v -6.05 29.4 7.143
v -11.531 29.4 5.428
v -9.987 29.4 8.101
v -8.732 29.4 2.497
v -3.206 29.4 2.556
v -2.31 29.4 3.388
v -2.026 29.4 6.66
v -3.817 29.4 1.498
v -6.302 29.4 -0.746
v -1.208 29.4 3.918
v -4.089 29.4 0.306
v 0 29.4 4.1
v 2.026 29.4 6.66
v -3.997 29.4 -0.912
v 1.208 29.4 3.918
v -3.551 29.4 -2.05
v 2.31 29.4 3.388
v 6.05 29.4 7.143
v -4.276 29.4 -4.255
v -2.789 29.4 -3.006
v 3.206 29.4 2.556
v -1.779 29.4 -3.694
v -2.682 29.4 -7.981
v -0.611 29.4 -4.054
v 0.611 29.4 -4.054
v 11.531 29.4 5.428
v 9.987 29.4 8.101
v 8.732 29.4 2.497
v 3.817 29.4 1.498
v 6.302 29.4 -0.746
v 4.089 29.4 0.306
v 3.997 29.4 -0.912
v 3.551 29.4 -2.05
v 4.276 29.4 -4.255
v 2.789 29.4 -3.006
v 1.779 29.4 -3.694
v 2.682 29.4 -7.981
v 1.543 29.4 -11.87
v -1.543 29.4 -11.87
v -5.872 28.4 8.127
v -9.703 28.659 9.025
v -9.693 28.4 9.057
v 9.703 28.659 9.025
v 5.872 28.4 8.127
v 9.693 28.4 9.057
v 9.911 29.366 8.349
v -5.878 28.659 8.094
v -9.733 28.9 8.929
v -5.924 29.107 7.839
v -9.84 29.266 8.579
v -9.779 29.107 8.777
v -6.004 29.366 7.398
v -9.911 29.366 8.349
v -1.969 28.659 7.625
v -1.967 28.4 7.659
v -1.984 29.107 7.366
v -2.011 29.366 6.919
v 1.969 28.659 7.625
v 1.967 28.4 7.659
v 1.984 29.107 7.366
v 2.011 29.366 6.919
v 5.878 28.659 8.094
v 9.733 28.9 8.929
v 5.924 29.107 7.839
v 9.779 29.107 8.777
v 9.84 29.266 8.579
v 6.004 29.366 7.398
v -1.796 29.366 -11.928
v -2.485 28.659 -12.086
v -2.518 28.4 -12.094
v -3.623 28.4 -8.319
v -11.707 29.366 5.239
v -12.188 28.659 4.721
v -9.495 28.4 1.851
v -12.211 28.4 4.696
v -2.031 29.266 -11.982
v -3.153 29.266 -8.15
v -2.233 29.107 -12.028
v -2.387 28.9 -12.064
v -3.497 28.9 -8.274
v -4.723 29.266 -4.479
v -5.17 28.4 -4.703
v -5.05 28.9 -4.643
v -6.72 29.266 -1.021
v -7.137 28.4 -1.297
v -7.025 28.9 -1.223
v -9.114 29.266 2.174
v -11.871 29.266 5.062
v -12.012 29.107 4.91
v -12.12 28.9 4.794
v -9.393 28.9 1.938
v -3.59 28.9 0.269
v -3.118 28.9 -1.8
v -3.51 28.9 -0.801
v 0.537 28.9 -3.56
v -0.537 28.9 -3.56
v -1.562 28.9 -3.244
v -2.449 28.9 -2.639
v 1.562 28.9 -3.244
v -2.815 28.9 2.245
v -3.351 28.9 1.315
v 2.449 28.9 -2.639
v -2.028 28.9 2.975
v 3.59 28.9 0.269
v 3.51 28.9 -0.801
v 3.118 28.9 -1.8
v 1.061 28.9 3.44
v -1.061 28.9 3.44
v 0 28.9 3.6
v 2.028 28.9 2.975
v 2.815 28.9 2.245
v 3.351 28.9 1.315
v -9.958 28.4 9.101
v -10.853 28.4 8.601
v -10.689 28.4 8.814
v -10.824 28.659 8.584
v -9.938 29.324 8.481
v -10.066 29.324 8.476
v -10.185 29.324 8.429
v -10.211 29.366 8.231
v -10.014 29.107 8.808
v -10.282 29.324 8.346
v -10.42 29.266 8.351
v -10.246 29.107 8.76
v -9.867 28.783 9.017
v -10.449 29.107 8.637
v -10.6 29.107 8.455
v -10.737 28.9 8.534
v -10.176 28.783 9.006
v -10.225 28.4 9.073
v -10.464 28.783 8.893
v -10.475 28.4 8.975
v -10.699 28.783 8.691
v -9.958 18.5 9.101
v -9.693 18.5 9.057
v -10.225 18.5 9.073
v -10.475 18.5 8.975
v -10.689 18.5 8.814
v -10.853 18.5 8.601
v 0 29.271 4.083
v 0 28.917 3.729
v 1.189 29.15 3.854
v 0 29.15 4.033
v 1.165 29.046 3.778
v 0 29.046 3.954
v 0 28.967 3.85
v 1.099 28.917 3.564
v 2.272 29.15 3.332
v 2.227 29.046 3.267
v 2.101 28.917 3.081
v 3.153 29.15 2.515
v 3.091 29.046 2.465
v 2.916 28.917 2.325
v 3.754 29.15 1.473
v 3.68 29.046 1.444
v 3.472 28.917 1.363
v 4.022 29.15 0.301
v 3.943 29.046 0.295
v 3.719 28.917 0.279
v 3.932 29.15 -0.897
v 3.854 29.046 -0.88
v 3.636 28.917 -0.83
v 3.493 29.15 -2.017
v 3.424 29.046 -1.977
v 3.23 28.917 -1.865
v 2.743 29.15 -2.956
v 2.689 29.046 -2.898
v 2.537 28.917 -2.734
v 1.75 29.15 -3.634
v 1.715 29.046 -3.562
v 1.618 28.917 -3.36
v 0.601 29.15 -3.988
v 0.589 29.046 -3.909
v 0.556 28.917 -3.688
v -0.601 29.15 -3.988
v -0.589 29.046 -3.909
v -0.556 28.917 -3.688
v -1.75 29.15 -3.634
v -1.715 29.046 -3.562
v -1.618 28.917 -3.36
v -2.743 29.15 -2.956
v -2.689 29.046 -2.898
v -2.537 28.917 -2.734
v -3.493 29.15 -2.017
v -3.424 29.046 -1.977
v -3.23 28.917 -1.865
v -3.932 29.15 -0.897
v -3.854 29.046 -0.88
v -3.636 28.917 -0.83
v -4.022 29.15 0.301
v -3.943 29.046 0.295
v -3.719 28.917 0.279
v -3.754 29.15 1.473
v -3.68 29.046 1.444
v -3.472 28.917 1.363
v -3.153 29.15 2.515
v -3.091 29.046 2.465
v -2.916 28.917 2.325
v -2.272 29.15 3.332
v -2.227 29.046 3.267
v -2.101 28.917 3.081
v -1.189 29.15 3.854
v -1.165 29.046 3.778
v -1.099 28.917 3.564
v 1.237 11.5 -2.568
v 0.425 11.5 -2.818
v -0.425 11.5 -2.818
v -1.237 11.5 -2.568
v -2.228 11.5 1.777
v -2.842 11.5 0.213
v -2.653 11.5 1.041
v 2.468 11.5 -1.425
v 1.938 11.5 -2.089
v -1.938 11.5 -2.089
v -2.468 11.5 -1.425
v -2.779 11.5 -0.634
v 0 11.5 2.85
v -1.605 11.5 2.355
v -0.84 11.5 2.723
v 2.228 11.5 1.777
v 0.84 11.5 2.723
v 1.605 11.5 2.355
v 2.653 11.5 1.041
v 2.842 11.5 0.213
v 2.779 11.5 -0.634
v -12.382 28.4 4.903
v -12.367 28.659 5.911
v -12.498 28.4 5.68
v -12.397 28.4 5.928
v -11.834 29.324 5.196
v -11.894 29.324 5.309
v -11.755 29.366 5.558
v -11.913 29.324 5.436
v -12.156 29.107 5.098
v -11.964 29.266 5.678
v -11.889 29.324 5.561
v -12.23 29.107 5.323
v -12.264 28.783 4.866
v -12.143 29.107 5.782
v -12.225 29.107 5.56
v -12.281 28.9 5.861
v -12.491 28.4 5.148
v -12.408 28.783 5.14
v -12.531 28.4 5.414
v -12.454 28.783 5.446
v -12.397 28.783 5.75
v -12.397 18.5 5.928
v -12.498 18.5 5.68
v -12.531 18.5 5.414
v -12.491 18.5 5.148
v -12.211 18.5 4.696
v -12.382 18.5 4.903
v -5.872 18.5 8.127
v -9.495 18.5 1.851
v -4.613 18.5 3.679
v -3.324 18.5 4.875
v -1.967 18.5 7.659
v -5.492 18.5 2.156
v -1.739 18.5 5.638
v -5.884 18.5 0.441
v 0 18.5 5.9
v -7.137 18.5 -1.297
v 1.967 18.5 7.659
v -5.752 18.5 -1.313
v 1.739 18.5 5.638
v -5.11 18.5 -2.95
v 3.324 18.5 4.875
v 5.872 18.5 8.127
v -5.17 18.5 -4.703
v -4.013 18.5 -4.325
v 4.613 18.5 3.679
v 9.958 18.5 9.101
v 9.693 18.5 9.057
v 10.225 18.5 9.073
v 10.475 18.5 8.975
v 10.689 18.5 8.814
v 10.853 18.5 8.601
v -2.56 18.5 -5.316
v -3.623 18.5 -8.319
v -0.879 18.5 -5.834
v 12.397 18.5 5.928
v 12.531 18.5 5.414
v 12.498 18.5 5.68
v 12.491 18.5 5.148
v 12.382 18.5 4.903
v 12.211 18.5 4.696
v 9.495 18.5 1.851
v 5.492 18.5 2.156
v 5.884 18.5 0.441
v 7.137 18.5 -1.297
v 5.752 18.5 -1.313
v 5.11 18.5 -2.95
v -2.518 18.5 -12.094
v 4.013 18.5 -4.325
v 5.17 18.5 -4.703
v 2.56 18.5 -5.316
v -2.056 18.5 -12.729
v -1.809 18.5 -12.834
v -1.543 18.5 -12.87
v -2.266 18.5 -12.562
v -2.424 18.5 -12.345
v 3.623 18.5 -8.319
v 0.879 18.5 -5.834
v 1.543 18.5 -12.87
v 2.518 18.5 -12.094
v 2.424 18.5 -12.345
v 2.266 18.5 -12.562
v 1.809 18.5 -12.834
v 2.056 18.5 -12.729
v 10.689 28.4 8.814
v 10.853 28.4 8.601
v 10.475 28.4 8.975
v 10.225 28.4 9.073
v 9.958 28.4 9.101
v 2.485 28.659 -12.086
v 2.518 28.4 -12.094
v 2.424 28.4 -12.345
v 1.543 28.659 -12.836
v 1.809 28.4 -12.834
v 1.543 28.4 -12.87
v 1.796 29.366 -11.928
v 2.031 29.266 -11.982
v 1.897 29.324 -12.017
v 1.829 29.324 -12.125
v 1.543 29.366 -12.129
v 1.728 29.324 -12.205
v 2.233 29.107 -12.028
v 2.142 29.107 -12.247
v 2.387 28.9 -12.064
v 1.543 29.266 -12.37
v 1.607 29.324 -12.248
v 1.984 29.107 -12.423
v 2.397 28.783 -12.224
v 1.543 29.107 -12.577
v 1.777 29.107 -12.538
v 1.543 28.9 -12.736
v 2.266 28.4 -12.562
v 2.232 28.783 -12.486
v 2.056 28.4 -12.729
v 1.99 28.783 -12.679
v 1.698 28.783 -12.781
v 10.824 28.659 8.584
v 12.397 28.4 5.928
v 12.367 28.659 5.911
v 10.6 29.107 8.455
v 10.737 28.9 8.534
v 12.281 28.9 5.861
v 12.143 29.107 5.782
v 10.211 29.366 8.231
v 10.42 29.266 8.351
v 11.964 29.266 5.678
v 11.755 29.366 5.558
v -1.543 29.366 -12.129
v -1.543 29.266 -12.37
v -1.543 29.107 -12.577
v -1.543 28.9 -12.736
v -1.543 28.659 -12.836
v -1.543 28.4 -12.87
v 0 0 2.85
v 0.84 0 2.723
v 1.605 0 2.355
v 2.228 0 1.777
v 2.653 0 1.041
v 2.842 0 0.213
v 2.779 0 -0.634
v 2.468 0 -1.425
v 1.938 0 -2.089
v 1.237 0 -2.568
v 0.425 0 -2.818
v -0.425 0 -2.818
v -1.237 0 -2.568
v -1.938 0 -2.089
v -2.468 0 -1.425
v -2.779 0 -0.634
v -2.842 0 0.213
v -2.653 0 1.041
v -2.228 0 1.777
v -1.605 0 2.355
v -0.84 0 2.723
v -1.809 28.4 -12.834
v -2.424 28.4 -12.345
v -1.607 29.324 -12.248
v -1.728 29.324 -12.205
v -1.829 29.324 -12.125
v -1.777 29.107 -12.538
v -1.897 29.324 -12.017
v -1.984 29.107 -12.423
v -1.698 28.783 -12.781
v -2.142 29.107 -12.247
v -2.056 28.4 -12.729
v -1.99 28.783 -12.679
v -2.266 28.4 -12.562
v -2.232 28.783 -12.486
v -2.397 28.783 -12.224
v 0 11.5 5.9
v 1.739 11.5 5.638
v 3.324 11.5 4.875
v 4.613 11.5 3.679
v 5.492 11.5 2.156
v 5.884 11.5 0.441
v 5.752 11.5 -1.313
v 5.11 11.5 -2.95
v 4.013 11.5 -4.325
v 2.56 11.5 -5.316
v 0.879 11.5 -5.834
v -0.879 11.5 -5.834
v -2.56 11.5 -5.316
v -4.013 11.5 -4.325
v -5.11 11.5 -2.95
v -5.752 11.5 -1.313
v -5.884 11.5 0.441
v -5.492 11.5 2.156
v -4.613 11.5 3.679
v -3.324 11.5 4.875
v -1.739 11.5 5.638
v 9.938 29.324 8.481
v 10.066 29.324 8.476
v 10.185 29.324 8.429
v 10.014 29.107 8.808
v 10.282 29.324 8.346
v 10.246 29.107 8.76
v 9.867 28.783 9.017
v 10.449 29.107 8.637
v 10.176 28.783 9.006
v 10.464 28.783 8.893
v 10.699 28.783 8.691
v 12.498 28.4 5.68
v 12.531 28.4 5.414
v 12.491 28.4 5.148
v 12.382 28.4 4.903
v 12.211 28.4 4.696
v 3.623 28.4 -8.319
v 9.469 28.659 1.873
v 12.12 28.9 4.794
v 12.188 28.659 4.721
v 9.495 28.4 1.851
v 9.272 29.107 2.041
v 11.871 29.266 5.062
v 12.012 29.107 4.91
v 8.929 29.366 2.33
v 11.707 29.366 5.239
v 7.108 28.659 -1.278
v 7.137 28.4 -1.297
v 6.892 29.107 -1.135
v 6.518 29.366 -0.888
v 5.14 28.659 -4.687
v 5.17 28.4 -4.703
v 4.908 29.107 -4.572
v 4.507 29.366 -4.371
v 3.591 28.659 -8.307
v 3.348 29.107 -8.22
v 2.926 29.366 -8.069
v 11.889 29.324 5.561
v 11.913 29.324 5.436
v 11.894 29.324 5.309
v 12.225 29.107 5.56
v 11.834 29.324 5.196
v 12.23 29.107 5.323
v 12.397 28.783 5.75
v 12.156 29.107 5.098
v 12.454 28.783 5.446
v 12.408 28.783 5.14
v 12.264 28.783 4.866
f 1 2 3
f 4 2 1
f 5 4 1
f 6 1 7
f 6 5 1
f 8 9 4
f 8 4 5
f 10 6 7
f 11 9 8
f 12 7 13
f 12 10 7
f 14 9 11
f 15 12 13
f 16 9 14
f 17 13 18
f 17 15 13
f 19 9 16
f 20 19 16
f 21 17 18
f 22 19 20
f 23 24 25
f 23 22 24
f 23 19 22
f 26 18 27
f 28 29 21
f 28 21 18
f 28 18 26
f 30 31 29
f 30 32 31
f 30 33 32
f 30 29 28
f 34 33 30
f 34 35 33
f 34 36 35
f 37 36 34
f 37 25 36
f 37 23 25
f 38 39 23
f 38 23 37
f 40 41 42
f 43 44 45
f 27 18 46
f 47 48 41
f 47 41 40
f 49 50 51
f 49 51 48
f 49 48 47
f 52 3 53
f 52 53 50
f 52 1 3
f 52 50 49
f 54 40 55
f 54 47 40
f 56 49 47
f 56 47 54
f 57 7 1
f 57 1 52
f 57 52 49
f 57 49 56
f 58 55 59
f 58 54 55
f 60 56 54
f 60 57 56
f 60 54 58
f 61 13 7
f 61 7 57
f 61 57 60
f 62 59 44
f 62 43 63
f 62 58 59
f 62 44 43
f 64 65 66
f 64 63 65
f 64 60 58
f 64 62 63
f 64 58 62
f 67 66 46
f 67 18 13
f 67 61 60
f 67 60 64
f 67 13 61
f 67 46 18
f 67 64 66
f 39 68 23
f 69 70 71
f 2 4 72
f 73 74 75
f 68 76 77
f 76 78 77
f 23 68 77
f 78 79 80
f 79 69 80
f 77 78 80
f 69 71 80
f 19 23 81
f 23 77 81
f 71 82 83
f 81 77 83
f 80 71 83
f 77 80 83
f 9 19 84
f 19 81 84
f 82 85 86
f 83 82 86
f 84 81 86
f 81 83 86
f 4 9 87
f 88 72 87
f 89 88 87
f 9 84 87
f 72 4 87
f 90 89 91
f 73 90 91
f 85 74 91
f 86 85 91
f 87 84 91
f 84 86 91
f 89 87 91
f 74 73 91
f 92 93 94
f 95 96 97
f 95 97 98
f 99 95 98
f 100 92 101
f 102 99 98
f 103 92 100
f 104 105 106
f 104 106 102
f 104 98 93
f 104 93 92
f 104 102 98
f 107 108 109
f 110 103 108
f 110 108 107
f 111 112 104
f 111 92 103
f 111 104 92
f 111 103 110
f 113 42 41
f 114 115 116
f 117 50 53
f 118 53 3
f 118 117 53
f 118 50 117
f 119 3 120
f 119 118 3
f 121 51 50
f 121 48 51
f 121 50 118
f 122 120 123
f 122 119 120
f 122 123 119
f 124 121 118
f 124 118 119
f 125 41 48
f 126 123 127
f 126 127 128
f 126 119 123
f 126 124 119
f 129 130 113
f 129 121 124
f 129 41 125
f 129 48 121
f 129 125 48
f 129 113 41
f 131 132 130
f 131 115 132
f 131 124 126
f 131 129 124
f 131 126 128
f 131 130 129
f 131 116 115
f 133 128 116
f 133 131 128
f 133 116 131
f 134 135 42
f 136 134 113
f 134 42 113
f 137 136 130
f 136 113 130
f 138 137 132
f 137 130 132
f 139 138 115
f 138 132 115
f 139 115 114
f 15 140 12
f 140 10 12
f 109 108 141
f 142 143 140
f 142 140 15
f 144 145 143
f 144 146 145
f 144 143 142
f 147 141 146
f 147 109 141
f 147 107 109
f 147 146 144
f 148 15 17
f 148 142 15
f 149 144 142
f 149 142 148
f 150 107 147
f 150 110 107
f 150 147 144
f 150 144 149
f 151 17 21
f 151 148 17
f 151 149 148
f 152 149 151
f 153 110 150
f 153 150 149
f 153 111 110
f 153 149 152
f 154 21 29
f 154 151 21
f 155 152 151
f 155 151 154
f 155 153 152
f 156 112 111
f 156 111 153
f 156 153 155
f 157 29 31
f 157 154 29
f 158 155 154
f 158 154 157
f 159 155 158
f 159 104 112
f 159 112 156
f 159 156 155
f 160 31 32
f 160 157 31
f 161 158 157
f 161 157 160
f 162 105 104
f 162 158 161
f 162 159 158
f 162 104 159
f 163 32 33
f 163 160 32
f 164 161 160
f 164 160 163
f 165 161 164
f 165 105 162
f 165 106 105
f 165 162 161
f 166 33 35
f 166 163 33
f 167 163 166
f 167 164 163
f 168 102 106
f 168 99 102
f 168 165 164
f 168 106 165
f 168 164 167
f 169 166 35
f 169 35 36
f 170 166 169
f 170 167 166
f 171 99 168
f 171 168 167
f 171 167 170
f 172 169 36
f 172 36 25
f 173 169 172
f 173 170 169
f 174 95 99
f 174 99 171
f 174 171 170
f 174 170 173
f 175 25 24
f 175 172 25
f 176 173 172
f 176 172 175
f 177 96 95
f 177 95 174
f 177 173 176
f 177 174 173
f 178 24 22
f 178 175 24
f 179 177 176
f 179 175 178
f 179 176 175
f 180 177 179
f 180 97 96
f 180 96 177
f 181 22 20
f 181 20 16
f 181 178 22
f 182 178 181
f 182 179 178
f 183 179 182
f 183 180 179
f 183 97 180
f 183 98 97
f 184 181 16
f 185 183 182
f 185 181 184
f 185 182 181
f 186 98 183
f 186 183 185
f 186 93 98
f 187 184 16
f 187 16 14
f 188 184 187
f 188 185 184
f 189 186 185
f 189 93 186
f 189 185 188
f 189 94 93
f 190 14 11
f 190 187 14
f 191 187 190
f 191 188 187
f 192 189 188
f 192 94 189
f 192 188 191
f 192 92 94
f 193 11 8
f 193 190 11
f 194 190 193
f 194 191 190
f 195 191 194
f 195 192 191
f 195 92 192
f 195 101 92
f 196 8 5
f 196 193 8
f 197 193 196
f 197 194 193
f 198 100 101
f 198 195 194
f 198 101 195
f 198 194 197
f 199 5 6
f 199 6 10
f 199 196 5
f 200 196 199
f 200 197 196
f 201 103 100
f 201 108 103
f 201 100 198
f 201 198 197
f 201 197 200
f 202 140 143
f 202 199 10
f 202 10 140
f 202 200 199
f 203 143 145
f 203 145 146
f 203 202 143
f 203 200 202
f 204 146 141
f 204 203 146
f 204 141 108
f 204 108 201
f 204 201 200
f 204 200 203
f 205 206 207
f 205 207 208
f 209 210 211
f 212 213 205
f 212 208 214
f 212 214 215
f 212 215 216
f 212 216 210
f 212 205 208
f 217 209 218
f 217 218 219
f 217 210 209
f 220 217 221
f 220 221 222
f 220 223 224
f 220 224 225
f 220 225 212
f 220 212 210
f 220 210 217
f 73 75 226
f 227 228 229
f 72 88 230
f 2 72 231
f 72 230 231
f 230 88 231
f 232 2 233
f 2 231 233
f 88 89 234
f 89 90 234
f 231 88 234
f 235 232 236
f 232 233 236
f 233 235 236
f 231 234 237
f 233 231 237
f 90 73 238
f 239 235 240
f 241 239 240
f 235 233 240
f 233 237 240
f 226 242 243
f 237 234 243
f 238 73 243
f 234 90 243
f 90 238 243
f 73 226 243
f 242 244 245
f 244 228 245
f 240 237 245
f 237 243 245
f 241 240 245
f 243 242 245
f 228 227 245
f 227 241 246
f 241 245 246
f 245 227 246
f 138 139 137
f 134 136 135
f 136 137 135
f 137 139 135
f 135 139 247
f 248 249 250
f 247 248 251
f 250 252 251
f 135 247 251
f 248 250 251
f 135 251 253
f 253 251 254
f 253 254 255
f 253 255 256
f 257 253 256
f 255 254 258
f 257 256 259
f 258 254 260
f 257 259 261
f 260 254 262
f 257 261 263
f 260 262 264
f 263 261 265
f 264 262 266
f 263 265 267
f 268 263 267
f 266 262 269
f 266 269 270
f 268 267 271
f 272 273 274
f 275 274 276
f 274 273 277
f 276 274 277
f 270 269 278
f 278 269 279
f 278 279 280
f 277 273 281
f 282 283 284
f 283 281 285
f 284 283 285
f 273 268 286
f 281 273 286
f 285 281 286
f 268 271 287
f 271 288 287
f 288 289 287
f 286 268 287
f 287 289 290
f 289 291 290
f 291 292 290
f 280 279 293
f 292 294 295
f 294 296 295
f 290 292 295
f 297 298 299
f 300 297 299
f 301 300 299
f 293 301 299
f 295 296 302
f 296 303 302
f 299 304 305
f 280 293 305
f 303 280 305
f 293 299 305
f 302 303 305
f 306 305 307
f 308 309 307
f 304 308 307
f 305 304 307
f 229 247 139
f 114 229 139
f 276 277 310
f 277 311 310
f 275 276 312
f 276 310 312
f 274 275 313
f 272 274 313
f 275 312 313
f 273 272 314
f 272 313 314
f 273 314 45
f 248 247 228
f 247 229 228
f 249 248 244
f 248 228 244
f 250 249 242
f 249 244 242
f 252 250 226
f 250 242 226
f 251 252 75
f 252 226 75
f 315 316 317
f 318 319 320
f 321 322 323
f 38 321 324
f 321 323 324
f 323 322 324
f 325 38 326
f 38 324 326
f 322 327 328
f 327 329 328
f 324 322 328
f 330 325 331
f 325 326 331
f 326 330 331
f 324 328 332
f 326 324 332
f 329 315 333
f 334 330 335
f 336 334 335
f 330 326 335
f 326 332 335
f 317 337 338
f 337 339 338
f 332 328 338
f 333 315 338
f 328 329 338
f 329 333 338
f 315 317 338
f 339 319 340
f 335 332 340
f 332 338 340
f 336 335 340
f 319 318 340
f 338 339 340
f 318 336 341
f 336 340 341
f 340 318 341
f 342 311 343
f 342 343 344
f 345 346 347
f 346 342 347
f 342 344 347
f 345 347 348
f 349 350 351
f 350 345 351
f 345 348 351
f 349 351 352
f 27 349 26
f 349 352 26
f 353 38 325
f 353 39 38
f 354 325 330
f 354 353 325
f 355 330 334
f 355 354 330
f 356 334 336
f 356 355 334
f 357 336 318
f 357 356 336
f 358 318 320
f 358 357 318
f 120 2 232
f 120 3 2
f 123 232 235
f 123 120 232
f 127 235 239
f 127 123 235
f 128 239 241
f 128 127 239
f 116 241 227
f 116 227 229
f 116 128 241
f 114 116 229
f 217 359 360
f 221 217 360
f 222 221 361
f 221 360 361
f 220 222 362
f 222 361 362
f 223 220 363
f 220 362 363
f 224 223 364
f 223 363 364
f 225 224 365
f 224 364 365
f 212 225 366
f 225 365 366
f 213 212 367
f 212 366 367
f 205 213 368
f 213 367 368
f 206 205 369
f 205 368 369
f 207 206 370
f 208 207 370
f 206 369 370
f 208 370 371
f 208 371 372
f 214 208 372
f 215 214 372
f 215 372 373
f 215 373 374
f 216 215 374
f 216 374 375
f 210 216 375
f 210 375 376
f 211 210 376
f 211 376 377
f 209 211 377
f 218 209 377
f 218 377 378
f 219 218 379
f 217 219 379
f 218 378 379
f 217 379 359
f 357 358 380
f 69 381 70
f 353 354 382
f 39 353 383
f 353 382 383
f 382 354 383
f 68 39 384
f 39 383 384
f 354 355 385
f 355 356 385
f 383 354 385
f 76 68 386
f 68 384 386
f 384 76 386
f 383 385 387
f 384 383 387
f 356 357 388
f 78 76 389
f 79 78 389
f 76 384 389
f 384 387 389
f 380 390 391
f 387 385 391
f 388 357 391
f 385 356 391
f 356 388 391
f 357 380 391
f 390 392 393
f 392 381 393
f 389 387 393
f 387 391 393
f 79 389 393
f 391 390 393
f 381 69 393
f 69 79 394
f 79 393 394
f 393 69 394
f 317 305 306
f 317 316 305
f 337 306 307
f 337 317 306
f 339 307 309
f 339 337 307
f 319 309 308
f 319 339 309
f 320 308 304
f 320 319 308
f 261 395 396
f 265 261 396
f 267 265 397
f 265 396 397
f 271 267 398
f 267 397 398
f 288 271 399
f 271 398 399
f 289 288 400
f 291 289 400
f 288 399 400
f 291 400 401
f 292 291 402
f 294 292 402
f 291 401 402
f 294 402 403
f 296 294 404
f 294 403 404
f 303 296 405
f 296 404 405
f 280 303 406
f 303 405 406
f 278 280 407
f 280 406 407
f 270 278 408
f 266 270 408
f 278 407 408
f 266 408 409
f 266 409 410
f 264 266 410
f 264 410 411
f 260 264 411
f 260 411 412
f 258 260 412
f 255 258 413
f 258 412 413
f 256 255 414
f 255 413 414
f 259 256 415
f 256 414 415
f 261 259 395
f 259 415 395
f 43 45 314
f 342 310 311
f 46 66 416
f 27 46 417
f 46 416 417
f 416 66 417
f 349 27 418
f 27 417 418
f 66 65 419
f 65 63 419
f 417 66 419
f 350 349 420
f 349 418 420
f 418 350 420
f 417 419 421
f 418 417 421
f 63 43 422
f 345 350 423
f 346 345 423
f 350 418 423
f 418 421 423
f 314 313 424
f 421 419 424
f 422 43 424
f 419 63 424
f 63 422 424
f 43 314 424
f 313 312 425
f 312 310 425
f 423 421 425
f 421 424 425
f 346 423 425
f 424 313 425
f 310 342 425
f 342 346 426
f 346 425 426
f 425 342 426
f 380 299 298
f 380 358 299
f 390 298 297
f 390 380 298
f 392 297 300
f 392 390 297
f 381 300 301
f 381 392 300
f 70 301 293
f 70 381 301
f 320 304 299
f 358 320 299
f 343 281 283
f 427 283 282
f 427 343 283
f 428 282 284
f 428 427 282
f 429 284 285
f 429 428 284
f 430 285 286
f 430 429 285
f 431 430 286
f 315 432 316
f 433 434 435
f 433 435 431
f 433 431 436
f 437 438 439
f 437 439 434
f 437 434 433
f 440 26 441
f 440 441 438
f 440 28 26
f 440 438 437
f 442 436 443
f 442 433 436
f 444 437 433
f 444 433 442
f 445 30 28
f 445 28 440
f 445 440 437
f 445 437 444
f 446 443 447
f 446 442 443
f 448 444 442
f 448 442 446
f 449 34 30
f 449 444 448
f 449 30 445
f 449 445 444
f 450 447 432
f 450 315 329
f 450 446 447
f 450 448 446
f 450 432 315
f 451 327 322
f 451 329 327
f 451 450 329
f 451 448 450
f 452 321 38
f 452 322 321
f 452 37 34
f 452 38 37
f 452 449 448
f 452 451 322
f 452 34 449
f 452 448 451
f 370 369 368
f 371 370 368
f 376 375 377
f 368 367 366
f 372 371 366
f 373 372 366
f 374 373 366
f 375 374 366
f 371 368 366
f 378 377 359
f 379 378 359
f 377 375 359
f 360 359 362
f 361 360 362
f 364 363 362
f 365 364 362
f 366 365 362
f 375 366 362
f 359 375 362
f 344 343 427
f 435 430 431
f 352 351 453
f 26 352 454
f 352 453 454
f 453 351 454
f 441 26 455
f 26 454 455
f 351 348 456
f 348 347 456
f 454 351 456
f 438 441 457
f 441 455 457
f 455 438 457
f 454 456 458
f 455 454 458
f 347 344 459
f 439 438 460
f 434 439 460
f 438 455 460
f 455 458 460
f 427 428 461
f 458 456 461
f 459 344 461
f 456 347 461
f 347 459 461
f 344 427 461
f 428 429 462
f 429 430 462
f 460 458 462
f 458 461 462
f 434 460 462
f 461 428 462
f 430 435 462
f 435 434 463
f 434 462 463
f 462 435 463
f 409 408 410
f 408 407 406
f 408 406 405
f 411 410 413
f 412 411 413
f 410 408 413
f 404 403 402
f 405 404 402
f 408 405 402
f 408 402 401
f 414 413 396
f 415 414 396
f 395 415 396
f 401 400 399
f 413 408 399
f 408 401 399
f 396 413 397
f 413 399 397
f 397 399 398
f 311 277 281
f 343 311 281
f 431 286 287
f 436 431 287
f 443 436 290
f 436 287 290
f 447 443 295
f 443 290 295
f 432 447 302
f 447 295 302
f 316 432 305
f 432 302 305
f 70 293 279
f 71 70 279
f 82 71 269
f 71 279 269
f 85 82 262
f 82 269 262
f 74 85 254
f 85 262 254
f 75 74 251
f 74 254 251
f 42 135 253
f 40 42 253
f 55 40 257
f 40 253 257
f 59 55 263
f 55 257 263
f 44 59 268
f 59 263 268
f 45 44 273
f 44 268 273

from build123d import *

# Parameters (mm, degrees)
SKETCH1_R           = 2.85
BOSS_EXTRUDE1_DEPTH = 11.5
SKETCH2_R           = 5.9
BOSS_EXTRUDE2_DEPTH = 7
BOSS_EXTRUDE3_DEPTH = 10.9
FILLET1_R           = 1
SKETCH4_R           = 4.1
CUT_EXTRUDE1_DEPTH  = 0.5
FILLET2_R           = 0.5


with BuildPart() as part:
    # Sketch1 → Boss-Extrude1 (new body)
    with BuildSketch(Plane(origin=(0, 0, 0), x_dir=(1, 0, 0), z_dir=(0, 1, 0))):
        with Locations(Location((0, 0, 0), (0, 0, 270))):
            Circle(SKETCH1_R)
    extrude(amount=BOSS_EXTRUDE1_DEPTH)


with BuildPart() as body_2:
    # Sketch2 → Boss-Extrude2 (new body)
    with BuildSketch(Plane(origin=(0, 11.5, 0), x_dir=(1, 0, 0), z_dir=(0, 1, 0))):
        with Locations(Location((0, 0, 0), (0, 0, 270))):
            Circle(SKETCH2_R)
    extrude(amount=BOSS_EXTRUDE2_DEPTH)

    # Sketch3 → Boss-Extrude3 (add)
    with BuildSketch(Plane(origin=(0, 18.5, 0), x_dir=(1, 0, 0), z_dir=(0, 1, 0))):
        with BuildLine():
            Line((10.45, -9.3), (12.8, -5.229680602))
            ThreePointArc((12.8, -5.229680602), (6.102756814, 2.970284867), (2.35, 12.870250337))
            Line((2.35, 12.870250337), (-2.35, 12.870250337))
            ThreePointArc((-2.35, 12.870250337), (-6.102756814, 2.970284867), (-12.8, -5.229680602))
            Line((-12.8, -5.229680602), (-10.45, -9.3))
            ThreePointArc((-10.45, -9.3), (0, -7.6), (10.45, -9.3))
        make_face()
    extrude(amount=BOSS_EXTRUDE3_DEPTH)

    # Fillet1
    fillet1_edges = [body_2.edges().sort_by_distance(p)[0] for p in [
        (-11.625, 29.4, 7.264840301),
        (-10.45, 23.95, 9.3),
        (10.45, 23.95, 9.3),
        (12.8, 23.95, 5.229680602),
        (2.35, 23.95, -12.870250337),
        (-2.35, 23.95, -12.870250337),
        (-12.8, 23.95, 5.229680602),
        (0, 29.4, 7.6),
        (11.625, 29.4, 7.264840301),
        (6.102756814, 29.4, -2.970284867),
        (0, 29.4, -12.870250337),
        (-6.102756814, 29.4, -2.970284867),
    ]]
    fillet(fillet1_edges, radius=FILLET1_R)

    # Sketch4 → Cut-Extrude1 (cut)
    with BuildSketch(Plane(origin=(0, 29.4, 0), x_dir=(1, 0, 0), z_dir=(0, 1, 0))):
        with Locations(Location((0, 0, 0), (0, 0, 270))):
            Circle(SKETCH4_R)
    extrude(amount=-CUT_EXTRUDE1_DEPTH, mode=Mode.SUBTRACT)

    # Fillet2
    fillet2_edges = [body_2.edges().sort_by_distance(p)[0] for p in [
        (0, 28.9, -4.1),
    ]]
    fillet(fillet2_edges, radius=FILLET2_R - 0.0001)  # a hair under: the kernel refuses the full size


solid = Compound([part.part, body_2.part])
